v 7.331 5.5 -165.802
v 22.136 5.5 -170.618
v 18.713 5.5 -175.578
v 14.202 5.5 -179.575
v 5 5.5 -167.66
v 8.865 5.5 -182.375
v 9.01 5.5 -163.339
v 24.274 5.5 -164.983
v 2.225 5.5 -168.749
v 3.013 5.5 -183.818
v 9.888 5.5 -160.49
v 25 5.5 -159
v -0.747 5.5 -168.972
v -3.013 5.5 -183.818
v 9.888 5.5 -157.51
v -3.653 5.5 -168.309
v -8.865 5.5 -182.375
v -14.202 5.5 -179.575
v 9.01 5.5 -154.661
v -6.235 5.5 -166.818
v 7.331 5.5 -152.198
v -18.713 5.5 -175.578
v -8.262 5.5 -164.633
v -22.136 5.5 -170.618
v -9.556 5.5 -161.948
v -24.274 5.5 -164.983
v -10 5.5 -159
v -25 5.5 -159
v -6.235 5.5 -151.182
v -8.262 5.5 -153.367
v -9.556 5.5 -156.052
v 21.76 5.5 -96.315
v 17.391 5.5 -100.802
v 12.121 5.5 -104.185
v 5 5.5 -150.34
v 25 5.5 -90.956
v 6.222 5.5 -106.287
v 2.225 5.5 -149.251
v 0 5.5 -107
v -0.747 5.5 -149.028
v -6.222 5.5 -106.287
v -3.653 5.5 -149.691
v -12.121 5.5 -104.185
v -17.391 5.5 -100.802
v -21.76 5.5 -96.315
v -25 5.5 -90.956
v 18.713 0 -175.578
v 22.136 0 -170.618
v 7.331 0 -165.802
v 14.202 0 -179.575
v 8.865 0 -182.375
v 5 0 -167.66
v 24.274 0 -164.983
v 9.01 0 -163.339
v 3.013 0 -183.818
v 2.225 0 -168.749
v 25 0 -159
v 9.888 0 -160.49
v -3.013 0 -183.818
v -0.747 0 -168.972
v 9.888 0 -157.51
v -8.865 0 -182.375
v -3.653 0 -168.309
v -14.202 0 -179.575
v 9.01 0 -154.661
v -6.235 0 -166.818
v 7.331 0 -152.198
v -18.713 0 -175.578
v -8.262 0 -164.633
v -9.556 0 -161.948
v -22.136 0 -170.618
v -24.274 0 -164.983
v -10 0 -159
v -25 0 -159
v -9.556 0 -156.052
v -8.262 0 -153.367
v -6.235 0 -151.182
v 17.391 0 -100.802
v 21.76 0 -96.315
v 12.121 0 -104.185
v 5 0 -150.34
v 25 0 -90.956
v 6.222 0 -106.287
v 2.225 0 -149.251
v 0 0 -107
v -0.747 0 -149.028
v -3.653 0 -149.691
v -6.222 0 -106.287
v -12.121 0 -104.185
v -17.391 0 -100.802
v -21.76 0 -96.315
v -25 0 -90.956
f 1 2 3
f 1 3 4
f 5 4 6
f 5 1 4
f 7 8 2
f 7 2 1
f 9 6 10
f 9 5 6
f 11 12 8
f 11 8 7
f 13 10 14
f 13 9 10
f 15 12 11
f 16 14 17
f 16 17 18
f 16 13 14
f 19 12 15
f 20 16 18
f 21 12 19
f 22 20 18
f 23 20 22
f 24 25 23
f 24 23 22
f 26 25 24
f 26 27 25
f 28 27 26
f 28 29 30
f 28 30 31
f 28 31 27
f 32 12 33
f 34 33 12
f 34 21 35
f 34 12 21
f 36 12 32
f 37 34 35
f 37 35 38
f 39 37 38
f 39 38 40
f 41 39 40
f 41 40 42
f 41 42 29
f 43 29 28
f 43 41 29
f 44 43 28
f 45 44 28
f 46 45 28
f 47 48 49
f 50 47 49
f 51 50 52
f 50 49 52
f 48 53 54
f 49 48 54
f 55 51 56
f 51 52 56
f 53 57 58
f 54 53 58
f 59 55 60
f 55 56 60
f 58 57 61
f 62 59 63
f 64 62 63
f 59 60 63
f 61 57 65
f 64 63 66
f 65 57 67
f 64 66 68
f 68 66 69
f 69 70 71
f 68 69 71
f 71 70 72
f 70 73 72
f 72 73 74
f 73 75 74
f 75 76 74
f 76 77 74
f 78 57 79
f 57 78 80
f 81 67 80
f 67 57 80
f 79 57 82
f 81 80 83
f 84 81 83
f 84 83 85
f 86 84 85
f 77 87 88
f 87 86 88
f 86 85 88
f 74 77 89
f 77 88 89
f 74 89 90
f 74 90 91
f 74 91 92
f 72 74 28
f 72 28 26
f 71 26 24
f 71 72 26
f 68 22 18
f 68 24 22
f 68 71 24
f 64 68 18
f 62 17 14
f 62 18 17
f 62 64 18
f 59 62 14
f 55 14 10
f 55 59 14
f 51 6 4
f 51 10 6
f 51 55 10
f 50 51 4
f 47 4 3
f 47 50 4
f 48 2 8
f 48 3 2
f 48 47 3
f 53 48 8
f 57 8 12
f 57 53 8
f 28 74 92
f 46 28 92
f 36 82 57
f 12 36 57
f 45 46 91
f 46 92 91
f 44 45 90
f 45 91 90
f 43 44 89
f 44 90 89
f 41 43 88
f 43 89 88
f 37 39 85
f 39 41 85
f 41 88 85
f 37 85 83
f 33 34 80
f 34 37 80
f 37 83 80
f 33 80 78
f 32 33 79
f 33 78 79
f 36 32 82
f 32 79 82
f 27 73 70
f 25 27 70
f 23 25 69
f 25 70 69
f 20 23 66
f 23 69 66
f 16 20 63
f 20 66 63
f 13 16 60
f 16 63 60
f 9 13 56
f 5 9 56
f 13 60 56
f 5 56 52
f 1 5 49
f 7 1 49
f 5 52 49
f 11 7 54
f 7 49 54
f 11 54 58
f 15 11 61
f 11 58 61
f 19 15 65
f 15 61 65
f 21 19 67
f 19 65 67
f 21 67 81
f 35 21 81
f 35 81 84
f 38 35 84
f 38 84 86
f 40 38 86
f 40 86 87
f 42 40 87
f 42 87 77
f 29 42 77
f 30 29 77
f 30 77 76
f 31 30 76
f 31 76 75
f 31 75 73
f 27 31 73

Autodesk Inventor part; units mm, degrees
ref_plane "YZ Plane" through (0, 0, 0) normal (1, 0, 0) x (0, 1, 0)
ref_plane "XZ Plane" through (0, 0, 0) normal (0, 1, 0) x (-1, 0, 0)
ref_plane "XY Plane" through (0, 0, 0) normal (0, 0, 1) x (1, 0, 0)
sketch "スケッチ1" plane through (0, 0, 0) normal (0, 1, 0) x (-1, 0, 0)
  line L0 (25, 0) -> (-25, 0)
  line L1 (-25, 0) -> (-25, -159)
  line L2 (-25, -159) -> (25, -159)
  line L3 (25, -159) -> (25, 0)
  circle A0 centre (0, 0) radius 25
  circle A1 centre (0, 0) radius 57 construction
  circle A2 centre (0, -79.5) radius 22.5 construction
  circle A3 centre (0, 0) radius 75 construction
  circle A4 centre (0, -79.5) radius 10
  circle A5 centre (0, 0) radius 10
  circle A6 centre (0, -159) radius 10
  circle A7 centre (0, -159) radius 57 construction
  circle A8 centre (0, -159) radius 25
  circle A9 centre (0, -79.5) radius 27.5
  point P0 (25, -90.9564)
  point P1 (-25, -90.9564)
  dimension "d0" = 114
  dimension "d1" = 45
  dimension "d2" = 150
  dimension "d3" = 20
  dimension "d4" = 20
  dimension "d5" = 50
  dimension "d8" = 20
  dimension "d13" = 55
extrude "押し出し1" add sketch "スケッチ1" along normal blind 5.5 contours L3 A8 L1 A9 | A8 L2 A6 | L2 A6 A8
properties part number "ギアプレートupper_upper"
